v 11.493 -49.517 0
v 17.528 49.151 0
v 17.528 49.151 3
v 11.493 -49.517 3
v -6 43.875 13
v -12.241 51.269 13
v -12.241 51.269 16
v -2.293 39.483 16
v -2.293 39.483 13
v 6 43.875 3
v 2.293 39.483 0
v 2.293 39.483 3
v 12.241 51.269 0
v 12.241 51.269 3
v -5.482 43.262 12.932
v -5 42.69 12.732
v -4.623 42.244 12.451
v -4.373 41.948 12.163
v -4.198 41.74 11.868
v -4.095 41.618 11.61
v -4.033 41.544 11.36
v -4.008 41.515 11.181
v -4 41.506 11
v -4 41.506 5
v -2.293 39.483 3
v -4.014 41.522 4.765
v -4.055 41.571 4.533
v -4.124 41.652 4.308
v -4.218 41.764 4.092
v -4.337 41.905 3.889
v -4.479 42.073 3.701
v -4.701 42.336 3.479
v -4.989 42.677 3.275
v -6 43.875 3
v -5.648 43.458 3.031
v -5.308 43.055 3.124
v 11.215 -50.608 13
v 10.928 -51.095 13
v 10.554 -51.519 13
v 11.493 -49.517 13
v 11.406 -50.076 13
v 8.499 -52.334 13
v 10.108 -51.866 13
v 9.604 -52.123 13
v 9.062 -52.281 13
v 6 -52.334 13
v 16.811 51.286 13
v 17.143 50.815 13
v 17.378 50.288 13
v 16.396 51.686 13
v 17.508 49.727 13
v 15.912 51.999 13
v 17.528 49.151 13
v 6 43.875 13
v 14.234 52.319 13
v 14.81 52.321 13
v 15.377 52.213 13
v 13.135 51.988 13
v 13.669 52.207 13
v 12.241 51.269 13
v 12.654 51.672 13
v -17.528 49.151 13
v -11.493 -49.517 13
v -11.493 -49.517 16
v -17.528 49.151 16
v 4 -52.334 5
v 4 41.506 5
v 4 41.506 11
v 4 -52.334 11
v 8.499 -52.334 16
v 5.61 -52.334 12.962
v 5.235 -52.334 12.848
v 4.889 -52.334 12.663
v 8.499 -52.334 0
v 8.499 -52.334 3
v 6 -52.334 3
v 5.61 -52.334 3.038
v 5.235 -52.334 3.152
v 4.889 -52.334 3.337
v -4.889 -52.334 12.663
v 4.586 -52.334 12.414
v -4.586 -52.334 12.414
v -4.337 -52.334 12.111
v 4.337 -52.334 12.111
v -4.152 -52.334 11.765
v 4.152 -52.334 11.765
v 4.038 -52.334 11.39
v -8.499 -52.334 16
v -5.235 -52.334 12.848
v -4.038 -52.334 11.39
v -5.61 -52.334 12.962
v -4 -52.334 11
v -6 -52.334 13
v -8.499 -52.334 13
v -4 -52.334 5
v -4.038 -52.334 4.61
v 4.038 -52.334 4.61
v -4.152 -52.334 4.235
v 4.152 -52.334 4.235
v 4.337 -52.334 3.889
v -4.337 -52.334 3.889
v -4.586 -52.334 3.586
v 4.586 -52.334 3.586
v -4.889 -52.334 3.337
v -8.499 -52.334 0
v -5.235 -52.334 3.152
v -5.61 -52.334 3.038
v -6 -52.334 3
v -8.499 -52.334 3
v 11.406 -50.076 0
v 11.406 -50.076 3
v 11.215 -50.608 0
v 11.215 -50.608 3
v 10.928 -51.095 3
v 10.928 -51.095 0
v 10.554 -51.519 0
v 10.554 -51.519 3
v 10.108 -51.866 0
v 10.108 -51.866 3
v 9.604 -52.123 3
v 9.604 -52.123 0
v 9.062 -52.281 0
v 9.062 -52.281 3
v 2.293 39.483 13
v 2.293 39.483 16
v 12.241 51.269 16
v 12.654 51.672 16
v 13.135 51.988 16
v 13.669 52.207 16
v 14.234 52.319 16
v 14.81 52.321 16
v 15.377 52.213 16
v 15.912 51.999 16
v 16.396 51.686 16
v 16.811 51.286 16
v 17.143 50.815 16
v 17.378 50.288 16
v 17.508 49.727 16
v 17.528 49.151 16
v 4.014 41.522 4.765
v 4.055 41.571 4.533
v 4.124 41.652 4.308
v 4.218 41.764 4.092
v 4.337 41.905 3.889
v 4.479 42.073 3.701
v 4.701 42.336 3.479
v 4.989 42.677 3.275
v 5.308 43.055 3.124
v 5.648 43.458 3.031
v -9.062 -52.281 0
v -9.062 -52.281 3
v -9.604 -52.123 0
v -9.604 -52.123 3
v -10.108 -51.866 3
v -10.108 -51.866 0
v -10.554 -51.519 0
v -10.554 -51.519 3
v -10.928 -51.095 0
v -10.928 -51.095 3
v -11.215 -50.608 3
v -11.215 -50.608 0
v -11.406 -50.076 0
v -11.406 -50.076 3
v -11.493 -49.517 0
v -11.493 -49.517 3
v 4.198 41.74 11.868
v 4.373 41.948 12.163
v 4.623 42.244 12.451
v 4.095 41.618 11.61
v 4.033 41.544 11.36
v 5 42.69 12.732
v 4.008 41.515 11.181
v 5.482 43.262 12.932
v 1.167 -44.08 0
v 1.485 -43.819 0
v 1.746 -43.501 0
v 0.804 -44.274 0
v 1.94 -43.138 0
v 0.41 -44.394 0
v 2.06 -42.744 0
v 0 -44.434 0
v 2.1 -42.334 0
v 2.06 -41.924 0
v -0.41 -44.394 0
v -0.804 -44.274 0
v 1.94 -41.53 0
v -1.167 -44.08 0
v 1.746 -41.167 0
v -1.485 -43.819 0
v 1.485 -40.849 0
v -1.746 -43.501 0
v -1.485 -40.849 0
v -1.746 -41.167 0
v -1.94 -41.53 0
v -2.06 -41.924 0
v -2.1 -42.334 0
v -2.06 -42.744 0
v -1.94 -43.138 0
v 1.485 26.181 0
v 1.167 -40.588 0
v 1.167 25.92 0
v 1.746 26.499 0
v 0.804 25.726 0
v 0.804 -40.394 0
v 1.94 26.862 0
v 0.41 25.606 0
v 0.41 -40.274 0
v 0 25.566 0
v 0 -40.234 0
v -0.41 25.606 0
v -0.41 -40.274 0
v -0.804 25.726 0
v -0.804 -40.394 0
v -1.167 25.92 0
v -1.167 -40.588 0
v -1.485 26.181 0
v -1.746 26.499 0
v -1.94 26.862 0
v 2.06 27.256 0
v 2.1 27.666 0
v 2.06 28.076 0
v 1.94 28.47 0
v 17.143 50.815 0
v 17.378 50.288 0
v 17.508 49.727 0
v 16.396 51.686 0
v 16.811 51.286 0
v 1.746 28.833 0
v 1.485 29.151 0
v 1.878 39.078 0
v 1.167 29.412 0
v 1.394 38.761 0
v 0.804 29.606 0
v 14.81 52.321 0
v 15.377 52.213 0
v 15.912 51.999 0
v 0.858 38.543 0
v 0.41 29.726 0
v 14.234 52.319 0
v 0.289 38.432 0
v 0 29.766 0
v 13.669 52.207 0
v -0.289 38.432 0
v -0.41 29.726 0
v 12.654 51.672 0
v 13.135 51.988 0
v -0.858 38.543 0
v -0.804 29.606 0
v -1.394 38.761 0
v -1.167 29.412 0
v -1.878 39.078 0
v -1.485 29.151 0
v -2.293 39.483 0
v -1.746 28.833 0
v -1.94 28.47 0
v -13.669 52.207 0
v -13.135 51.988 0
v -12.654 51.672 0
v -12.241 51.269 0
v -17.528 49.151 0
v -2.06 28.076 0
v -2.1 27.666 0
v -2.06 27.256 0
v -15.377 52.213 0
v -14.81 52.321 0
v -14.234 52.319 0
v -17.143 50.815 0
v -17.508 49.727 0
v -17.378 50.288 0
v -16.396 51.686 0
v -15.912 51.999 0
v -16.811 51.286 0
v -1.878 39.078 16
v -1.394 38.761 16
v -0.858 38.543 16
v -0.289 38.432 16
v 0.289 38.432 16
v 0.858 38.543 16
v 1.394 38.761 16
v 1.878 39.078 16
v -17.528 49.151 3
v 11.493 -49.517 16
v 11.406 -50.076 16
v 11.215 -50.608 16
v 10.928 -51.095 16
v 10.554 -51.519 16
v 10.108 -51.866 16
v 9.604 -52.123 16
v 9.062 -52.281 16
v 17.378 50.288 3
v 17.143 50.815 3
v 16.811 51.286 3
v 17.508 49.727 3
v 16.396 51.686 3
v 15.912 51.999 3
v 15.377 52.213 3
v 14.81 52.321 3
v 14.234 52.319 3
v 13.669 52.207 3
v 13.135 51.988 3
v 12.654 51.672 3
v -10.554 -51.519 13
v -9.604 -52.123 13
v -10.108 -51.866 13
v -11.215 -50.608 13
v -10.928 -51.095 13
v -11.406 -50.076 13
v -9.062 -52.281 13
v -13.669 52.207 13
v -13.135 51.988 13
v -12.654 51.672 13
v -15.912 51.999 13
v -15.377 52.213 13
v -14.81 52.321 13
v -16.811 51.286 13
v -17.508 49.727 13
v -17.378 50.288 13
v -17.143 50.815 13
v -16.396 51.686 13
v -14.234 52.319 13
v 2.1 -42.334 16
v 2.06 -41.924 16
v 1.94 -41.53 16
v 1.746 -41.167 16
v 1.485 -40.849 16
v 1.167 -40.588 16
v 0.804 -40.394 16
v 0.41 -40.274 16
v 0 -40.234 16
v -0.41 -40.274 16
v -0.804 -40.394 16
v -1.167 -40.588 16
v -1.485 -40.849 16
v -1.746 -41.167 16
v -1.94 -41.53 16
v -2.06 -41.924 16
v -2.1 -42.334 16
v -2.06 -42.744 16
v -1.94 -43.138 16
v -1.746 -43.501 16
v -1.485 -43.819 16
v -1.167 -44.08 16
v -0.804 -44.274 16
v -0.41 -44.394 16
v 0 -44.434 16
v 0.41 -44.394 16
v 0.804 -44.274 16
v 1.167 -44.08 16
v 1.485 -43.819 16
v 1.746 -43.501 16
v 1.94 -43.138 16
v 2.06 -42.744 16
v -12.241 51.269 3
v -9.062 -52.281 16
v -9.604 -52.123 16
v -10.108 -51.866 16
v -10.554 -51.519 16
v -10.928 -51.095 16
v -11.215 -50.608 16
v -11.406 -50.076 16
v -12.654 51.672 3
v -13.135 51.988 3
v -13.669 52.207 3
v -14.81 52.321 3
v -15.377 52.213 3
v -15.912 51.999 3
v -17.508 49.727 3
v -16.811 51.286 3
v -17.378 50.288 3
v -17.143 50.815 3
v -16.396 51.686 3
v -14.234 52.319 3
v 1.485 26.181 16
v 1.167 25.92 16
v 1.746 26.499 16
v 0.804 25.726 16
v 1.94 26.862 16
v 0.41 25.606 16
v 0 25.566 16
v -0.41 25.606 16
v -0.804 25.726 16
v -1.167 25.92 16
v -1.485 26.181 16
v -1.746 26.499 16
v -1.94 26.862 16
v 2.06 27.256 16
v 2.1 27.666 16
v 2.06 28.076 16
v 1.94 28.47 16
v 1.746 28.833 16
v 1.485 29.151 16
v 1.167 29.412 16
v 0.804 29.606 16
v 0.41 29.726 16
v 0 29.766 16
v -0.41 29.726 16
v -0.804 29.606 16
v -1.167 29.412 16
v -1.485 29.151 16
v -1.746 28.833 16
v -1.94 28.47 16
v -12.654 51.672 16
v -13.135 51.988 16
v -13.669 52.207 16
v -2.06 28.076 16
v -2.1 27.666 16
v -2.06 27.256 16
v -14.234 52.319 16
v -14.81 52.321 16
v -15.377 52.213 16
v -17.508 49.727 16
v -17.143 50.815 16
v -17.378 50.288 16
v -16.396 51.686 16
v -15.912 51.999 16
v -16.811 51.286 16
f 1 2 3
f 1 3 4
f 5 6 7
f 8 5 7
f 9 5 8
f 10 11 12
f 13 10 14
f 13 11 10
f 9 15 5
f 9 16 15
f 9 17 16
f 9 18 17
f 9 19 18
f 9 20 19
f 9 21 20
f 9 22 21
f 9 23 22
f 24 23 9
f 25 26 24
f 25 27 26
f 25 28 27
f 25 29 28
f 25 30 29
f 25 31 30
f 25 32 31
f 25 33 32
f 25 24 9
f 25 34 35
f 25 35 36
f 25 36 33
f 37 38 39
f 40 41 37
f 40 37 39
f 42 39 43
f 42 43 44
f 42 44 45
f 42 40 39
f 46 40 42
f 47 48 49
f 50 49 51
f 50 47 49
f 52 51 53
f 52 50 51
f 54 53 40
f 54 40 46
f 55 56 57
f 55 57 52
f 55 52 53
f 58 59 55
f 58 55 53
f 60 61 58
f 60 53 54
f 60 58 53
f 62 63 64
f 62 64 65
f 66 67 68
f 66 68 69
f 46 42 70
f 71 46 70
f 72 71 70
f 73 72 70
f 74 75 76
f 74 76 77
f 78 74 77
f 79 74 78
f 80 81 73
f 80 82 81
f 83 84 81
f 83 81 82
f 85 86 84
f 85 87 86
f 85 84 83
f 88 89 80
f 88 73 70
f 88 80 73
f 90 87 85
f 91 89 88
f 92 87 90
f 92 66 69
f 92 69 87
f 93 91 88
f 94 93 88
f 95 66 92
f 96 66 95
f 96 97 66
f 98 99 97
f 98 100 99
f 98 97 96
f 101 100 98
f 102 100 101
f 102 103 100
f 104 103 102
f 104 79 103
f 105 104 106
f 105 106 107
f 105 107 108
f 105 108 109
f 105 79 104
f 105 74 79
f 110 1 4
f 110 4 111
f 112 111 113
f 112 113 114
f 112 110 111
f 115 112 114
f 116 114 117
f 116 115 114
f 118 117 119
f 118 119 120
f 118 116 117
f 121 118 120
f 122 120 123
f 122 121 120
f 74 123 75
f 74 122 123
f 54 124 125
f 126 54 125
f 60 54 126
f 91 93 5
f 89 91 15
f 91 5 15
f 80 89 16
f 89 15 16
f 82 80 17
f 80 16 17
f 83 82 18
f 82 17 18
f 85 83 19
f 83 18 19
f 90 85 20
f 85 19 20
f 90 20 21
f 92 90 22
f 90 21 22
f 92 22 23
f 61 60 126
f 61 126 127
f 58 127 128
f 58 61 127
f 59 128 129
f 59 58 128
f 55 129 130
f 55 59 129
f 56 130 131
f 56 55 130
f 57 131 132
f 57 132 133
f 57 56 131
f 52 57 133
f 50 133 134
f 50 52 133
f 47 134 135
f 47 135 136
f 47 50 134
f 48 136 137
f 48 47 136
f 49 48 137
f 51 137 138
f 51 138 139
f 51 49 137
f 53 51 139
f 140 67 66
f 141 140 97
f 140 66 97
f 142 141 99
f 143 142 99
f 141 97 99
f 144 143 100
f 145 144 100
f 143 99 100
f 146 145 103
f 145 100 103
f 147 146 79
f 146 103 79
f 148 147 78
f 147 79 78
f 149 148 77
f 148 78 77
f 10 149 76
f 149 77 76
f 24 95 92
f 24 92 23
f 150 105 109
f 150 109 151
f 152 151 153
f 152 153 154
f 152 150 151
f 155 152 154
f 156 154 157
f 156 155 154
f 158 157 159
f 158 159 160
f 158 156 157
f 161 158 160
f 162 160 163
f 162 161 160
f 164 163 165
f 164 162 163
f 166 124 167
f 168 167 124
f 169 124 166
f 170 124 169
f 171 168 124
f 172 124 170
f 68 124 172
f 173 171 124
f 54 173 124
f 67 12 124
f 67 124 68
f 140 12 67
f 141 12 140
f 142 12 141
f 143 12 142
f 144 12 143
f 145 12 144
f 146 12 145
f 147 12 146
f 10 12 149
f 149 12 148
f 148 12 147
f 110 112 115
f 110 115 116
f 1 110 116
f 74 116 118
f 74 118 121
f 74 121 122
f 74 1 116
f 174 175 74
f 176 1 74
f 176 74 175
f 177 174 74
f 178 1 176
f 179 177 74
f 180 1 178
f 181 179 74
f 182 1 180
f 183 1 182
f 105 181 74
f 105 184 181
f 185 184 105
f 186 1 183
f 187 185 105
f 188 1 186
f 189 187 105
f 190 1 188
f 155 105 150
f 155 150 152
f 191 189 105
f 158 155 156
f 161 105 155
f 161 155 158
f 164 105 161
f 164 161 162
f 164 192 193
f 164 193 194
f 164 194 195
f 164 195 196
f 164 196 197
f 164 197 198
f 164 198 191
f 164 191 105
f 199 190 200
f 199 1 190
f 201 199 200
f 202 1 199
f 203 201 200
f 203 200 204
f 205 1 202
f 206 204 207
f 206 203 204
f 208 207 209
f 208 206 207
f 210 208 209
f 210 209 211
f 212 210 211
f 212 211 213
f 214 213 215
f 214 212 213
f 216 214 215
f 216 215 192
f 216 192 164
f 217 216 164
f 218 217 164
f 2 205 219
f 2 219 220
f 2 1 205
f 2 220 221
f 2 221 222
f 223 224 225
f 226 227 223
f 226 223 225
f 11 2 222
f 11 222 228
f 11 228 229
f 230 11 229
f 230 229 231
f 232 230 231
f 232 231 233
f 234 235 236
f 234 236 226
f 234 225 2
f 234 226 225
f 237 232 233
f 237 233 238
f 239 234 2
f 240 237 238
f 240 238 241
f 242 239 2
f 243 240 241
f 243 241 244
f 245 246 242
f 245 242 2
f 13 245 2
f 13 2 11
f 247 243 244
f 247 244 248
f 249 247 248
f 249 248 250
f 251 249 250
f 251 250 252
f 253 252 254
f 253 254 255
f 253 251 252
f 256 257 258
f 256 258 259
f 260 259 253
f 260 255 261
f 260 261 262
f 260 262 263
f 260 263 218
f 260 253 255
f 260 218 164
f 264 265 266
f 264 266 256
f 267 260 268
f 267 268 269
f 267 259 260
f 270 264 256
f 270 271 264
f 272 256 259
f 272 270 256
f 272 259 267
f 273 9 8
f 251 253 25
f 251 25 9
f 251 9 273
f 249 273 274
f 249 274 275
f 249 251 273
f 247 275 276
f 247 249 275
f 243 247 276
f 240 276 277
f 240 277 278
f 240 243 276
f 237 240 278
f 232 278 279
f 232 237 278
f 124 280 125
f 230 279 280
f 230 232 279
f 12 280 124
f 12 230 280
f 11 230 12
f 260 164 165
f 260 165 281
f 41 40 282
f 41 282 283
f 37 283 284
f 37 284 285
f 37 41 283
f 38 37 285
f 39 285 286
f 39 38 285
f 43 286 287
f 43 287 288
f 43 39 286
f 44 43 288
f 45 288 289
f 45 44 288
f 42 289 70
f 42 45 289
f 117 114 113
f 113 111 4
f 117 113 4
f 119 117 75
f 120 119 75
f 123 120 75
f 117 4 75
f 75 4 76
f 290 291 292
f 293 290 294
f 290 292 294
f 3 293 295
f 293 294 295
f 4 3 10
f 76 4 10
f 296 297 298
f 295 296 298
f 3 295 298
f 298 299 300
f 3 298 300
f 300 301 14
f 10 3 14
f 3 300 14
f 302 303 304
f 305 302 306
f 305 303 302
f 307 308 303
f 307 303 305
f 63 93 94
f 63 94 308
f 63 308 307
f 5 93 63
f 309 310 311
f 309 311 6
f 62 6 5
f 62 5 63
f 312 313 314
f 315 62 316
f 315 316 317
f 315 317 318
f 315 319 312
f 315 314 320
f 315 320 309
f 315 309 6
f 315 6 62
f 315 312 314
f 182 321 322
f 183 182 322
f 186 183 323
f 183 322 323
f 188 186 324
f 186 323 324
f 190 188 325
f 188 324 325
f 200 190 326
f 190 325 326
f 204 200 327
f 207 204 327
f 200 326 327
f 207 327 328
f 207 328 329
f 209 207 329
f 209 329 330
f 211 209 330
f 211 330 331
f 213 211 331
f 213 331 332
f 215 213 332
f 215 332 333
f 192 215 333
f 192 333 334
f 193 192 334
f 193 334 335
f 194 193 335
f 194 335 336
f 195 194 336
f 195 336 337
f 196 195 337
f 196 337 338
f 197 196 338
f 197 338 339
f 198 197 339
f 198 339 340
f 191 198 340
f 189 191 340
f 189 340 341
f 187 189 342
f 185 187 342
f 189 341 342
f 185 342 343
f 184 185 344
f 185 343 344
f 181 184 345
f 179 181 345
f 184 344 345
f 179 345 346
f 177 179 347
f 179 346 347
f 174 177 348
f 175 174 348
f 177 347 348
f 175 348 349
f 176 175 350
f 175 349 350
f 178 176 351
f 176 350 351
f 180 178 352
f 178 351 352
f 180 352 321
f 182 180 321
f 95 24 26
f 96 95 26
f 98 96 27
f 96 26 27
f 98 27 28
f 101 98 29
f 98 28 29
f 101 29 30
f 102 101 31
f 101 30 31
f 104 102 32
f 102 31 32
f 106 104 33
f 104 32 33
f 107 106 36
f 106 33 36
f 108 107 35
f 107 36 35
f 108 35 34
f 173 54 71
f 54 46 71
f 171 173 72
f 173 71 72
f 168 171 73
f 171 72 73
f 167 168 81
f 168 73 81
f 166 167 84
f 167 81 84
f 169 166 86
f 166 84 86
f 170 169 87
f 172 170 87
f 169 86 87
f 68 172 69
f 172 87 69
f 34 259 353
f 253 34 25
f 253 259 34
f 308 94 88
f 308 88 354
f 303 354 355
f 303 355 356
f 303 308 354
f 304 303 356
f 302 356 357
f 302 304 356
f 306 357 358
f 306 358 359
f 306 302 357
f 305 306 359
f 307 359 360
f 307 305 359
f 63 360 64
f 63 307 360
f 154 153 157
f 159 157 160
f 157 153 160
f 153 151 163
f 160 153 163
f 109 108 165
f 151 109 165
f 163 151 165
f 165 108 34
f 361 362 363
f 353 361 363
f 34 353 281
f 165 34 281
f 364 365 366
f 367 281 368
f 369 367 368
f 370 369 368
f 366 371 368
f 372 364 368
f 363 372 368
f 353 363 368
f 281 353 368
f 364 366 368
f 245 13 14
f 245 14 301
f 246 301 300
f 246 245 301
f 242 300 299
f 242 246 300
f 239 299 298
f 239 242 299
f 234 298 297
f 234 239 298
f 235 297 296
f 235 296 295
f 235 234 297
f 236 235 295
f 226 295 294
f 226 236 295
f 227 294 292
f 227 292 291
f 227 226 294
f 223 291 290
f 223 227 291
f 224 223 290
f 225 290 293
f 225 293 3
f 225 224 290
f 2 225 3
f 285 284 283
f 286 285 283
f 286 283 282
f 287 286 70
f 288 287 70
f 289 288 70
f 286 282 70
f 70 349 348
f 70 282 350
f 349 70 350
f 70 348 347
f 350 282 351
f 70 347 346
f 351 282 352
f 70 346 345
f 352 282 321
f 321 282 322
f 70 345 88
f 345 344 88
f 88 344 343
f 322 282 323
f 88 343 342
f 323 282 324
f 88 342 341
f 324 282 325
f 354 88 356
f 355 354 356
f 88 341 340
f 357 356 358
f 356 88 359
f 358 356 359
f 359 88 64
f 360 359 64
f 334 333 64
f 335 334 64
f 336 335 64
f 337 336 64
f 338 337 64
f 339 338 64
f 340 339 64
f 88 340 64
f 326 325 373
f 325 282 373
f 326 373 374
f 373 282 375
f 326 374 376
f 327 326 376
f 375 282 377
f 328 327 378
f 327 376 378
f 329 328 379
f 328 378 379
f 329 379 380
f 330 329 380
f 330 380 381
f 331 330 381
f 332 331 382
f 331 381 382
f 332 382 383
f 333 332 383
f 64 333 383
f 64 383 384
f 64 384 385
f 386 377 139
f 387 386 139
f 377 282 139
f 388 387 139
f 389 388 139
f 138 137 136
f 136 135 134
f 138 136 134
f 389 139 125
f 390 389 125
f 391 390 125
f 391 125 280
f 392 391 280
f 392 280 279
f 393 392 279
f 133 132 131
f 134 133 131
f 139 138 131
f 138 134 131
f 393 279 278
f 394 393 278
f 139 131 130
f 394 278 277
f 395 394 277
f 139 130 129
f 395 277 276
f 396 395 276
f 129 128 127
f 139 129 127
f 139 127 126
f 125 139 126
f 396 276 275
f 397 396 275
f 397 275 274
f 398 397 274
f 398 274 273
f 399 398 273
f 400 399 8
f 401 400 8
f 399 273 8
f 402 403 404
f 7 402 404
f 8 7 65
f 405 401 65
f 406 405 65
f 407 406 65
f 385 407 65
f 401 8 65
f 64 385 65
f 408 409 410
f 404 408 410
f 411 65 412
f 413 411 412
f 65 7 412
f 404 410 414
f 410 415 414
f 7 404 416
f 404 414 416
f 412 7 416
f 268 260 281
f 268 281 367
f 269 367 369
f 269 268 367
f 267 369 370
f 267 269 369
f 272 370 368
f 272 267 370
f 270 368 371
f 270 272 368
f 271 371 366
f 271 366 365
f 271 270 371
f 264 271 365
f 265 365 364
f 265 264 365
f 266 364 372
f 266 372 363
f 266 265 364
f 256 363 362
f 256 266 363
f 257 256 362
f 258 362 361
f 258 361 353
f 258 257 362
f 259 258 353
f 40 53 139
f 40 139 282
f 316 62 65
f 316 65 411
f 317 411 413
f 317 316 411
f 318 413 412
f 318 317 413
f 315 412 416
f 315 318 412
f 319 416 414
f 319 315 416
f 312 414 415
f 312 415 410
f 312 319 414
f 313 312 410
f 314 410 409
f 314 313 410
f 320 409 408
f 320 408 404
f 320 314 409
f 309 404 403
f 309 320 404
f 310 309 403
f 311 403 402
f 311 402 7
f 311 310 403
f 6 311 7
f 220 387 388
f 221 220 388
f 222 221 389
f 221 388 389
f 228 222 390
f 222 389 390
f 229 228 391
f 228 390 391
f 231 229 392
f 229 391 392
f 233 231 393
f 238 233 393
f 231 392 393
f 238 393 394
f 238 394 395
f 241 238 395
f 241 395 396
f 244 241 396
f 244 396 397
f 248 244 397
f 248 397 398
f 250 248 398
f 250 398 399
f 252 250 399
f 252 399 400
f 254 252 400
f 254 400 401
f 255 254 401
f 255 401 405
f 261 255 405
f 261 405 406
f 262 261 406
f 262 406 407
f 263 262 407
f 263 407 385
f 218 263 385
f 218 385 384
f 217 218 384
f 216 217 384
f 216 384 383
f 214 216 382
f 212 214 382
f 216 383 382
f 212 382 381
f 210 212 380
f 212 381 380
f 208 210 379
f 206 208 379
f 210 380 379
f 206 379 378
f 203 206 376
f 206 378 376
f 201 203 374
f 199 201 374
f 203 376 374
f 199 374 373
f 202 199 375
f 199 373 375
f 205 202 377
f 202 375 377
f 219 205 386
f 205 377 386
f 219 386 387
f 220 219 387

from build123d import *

# Parameters (mm, degrees)
EXTRUDE_1_DEPTH     = 3
EXTRUDE_2_DEPTH     = 10
EXTRUDE_3_DEPTH     = 3
FILLET_1_R          = 2
SKETCH_4_R          = 2.1
CUT_EXTRUDE_1_DEPTH = 37


with BuildPart() as part:
    # 草图1 → 凸台-拉伸1 (new body)
    with BuildSketch(Plane.XY):
        with BuildLine():
            Line((-12.241114452, 51.269005321), (-2.292502811, 39.48265225))
            ThreePointArc((-2.292502811, 39.48265225), (0, 38.417705443), (2.292502811, 39.48265225))
            Line((2.292502811, 39.48265225), (12.241114452, 51.269005321))
            ThreePointArc((12.241114452, 51.269005321), (15.649349314, 52.118757685), (17.528021658, 49.150806509))
            Line((17.528021658, 49.150806509), (11.493234109, -49.517097746))
            ThreePointArc((11.493234109, -49.517097746), (10.554378685, -51.519065037), (8.498829714, -52.333952128))
            Line((8.498829714, -52.333952128), (-8.498829714, -52.333952128))
            ThreePointArc((-8.498829714, -52.333952128), (-10.554378685, -51.519065037), (-11.493234109, -49.517097746))
            Line((-11.493234109, -49.517097746), (-17.528021658, 49.150806509))
            ThreePointArc((-17.528021658, 49.150806509), (-15.649349314, 52.118757685), (-12.241114452, 51.269005321))
        make_face()
    extrude(amount=EXTRUDE_1_DEPTH)

    # 草图2 → 凸台-拉伸2 (add)
    with BuildSketch(Plane.XY.offset(3)):
        with BuildLine():
            Line((-4, -52.333952128), (-4, 41.505564136))
            Line((-4, 41.505564136), (-2.292502811, 39.48265225))
            ThreePointArc((-2.292502811, 39.48265225), (0, 38.417705443), (2.292502811, 39.48265225))
            Line((2.292502811, 39.48265225), (4, 41.505564136))
            Line((4, 41.505564136), (4, -52.333952128))
            Line((4, -52.333952128), (-4, -52.333952128))
        make_face()
    extrude(amount=EXTRUDE_2_DEPTH)

    # 草图3 → 凸台-拉伸3 (add)
    with BuildSketch(Plane.XY.offset(13)):
        with BuildLine():
            Line((-12.241114452, 51.269005321), (-2.292502811, 39.48265225))
            ThreePointArc((-2.292502811, 39.48265225), (0, 38.417705443), (2.292502811, 39.48265225))
            Line((2.292502811, 39.48265225), (12.241114452, 51.269005321))
            ThreePointArc((12.241114452, 51.269005321), (15.649349314, 52.118757685), (17.528021658, 49.150806509))
            Line((17.528021658, 49.150806509), (11.493234109, -49.517097746))
            ThreePointArc((11.493234109, -49.517097746), (10.554378685, -51.519065037), (8.498829714, -52.333952128))
            Line((8.498829714, -52.333952128), (-8.498829714, -52.333952128))
            ThreePointArc((-8.498829714, -52.333952128), (-10.554378685, -51.519065037), (-11.493234109, -49.517097746))
            Line((-11.493234109, -49.517097746), (-17.528021658, 49.150806509))
            ThreePointArc((-17.528021658, 49.150806509), (-15.649349314, 52.118757685), (-12.241114452, 51.269005321))
        make_face()
    extrude(amount=EXTRUDE_3_DEPTH)

    # 圆角1
    fillet_1_edges = [part.edges().sort_by_distance(p)[0] for p in [
        (4, -5.414193996, 3),
        (-4, -5.414193996, 3),
        (4, -5.414193996, 13),
        (-4, -5.414193996, 13),
    ]]
    fillet(fillet_1_edges, radius=FILLET_1_R)

    # 草图4 → 切除-拉伸1 (cut)
    with BuildSketch(Plane.XY.offset(16)):
        with Locations((0, -42.333952128)):
            Circle(SKETCH_4_R)
        with Locations((0, 27.666047872)):
            Circle(SKETCH_4_R)
    extrude(amount=-CUT_EXTRUDE_1_DEPTH, mode=Mode.SUBTRACT)


solid = part.part
